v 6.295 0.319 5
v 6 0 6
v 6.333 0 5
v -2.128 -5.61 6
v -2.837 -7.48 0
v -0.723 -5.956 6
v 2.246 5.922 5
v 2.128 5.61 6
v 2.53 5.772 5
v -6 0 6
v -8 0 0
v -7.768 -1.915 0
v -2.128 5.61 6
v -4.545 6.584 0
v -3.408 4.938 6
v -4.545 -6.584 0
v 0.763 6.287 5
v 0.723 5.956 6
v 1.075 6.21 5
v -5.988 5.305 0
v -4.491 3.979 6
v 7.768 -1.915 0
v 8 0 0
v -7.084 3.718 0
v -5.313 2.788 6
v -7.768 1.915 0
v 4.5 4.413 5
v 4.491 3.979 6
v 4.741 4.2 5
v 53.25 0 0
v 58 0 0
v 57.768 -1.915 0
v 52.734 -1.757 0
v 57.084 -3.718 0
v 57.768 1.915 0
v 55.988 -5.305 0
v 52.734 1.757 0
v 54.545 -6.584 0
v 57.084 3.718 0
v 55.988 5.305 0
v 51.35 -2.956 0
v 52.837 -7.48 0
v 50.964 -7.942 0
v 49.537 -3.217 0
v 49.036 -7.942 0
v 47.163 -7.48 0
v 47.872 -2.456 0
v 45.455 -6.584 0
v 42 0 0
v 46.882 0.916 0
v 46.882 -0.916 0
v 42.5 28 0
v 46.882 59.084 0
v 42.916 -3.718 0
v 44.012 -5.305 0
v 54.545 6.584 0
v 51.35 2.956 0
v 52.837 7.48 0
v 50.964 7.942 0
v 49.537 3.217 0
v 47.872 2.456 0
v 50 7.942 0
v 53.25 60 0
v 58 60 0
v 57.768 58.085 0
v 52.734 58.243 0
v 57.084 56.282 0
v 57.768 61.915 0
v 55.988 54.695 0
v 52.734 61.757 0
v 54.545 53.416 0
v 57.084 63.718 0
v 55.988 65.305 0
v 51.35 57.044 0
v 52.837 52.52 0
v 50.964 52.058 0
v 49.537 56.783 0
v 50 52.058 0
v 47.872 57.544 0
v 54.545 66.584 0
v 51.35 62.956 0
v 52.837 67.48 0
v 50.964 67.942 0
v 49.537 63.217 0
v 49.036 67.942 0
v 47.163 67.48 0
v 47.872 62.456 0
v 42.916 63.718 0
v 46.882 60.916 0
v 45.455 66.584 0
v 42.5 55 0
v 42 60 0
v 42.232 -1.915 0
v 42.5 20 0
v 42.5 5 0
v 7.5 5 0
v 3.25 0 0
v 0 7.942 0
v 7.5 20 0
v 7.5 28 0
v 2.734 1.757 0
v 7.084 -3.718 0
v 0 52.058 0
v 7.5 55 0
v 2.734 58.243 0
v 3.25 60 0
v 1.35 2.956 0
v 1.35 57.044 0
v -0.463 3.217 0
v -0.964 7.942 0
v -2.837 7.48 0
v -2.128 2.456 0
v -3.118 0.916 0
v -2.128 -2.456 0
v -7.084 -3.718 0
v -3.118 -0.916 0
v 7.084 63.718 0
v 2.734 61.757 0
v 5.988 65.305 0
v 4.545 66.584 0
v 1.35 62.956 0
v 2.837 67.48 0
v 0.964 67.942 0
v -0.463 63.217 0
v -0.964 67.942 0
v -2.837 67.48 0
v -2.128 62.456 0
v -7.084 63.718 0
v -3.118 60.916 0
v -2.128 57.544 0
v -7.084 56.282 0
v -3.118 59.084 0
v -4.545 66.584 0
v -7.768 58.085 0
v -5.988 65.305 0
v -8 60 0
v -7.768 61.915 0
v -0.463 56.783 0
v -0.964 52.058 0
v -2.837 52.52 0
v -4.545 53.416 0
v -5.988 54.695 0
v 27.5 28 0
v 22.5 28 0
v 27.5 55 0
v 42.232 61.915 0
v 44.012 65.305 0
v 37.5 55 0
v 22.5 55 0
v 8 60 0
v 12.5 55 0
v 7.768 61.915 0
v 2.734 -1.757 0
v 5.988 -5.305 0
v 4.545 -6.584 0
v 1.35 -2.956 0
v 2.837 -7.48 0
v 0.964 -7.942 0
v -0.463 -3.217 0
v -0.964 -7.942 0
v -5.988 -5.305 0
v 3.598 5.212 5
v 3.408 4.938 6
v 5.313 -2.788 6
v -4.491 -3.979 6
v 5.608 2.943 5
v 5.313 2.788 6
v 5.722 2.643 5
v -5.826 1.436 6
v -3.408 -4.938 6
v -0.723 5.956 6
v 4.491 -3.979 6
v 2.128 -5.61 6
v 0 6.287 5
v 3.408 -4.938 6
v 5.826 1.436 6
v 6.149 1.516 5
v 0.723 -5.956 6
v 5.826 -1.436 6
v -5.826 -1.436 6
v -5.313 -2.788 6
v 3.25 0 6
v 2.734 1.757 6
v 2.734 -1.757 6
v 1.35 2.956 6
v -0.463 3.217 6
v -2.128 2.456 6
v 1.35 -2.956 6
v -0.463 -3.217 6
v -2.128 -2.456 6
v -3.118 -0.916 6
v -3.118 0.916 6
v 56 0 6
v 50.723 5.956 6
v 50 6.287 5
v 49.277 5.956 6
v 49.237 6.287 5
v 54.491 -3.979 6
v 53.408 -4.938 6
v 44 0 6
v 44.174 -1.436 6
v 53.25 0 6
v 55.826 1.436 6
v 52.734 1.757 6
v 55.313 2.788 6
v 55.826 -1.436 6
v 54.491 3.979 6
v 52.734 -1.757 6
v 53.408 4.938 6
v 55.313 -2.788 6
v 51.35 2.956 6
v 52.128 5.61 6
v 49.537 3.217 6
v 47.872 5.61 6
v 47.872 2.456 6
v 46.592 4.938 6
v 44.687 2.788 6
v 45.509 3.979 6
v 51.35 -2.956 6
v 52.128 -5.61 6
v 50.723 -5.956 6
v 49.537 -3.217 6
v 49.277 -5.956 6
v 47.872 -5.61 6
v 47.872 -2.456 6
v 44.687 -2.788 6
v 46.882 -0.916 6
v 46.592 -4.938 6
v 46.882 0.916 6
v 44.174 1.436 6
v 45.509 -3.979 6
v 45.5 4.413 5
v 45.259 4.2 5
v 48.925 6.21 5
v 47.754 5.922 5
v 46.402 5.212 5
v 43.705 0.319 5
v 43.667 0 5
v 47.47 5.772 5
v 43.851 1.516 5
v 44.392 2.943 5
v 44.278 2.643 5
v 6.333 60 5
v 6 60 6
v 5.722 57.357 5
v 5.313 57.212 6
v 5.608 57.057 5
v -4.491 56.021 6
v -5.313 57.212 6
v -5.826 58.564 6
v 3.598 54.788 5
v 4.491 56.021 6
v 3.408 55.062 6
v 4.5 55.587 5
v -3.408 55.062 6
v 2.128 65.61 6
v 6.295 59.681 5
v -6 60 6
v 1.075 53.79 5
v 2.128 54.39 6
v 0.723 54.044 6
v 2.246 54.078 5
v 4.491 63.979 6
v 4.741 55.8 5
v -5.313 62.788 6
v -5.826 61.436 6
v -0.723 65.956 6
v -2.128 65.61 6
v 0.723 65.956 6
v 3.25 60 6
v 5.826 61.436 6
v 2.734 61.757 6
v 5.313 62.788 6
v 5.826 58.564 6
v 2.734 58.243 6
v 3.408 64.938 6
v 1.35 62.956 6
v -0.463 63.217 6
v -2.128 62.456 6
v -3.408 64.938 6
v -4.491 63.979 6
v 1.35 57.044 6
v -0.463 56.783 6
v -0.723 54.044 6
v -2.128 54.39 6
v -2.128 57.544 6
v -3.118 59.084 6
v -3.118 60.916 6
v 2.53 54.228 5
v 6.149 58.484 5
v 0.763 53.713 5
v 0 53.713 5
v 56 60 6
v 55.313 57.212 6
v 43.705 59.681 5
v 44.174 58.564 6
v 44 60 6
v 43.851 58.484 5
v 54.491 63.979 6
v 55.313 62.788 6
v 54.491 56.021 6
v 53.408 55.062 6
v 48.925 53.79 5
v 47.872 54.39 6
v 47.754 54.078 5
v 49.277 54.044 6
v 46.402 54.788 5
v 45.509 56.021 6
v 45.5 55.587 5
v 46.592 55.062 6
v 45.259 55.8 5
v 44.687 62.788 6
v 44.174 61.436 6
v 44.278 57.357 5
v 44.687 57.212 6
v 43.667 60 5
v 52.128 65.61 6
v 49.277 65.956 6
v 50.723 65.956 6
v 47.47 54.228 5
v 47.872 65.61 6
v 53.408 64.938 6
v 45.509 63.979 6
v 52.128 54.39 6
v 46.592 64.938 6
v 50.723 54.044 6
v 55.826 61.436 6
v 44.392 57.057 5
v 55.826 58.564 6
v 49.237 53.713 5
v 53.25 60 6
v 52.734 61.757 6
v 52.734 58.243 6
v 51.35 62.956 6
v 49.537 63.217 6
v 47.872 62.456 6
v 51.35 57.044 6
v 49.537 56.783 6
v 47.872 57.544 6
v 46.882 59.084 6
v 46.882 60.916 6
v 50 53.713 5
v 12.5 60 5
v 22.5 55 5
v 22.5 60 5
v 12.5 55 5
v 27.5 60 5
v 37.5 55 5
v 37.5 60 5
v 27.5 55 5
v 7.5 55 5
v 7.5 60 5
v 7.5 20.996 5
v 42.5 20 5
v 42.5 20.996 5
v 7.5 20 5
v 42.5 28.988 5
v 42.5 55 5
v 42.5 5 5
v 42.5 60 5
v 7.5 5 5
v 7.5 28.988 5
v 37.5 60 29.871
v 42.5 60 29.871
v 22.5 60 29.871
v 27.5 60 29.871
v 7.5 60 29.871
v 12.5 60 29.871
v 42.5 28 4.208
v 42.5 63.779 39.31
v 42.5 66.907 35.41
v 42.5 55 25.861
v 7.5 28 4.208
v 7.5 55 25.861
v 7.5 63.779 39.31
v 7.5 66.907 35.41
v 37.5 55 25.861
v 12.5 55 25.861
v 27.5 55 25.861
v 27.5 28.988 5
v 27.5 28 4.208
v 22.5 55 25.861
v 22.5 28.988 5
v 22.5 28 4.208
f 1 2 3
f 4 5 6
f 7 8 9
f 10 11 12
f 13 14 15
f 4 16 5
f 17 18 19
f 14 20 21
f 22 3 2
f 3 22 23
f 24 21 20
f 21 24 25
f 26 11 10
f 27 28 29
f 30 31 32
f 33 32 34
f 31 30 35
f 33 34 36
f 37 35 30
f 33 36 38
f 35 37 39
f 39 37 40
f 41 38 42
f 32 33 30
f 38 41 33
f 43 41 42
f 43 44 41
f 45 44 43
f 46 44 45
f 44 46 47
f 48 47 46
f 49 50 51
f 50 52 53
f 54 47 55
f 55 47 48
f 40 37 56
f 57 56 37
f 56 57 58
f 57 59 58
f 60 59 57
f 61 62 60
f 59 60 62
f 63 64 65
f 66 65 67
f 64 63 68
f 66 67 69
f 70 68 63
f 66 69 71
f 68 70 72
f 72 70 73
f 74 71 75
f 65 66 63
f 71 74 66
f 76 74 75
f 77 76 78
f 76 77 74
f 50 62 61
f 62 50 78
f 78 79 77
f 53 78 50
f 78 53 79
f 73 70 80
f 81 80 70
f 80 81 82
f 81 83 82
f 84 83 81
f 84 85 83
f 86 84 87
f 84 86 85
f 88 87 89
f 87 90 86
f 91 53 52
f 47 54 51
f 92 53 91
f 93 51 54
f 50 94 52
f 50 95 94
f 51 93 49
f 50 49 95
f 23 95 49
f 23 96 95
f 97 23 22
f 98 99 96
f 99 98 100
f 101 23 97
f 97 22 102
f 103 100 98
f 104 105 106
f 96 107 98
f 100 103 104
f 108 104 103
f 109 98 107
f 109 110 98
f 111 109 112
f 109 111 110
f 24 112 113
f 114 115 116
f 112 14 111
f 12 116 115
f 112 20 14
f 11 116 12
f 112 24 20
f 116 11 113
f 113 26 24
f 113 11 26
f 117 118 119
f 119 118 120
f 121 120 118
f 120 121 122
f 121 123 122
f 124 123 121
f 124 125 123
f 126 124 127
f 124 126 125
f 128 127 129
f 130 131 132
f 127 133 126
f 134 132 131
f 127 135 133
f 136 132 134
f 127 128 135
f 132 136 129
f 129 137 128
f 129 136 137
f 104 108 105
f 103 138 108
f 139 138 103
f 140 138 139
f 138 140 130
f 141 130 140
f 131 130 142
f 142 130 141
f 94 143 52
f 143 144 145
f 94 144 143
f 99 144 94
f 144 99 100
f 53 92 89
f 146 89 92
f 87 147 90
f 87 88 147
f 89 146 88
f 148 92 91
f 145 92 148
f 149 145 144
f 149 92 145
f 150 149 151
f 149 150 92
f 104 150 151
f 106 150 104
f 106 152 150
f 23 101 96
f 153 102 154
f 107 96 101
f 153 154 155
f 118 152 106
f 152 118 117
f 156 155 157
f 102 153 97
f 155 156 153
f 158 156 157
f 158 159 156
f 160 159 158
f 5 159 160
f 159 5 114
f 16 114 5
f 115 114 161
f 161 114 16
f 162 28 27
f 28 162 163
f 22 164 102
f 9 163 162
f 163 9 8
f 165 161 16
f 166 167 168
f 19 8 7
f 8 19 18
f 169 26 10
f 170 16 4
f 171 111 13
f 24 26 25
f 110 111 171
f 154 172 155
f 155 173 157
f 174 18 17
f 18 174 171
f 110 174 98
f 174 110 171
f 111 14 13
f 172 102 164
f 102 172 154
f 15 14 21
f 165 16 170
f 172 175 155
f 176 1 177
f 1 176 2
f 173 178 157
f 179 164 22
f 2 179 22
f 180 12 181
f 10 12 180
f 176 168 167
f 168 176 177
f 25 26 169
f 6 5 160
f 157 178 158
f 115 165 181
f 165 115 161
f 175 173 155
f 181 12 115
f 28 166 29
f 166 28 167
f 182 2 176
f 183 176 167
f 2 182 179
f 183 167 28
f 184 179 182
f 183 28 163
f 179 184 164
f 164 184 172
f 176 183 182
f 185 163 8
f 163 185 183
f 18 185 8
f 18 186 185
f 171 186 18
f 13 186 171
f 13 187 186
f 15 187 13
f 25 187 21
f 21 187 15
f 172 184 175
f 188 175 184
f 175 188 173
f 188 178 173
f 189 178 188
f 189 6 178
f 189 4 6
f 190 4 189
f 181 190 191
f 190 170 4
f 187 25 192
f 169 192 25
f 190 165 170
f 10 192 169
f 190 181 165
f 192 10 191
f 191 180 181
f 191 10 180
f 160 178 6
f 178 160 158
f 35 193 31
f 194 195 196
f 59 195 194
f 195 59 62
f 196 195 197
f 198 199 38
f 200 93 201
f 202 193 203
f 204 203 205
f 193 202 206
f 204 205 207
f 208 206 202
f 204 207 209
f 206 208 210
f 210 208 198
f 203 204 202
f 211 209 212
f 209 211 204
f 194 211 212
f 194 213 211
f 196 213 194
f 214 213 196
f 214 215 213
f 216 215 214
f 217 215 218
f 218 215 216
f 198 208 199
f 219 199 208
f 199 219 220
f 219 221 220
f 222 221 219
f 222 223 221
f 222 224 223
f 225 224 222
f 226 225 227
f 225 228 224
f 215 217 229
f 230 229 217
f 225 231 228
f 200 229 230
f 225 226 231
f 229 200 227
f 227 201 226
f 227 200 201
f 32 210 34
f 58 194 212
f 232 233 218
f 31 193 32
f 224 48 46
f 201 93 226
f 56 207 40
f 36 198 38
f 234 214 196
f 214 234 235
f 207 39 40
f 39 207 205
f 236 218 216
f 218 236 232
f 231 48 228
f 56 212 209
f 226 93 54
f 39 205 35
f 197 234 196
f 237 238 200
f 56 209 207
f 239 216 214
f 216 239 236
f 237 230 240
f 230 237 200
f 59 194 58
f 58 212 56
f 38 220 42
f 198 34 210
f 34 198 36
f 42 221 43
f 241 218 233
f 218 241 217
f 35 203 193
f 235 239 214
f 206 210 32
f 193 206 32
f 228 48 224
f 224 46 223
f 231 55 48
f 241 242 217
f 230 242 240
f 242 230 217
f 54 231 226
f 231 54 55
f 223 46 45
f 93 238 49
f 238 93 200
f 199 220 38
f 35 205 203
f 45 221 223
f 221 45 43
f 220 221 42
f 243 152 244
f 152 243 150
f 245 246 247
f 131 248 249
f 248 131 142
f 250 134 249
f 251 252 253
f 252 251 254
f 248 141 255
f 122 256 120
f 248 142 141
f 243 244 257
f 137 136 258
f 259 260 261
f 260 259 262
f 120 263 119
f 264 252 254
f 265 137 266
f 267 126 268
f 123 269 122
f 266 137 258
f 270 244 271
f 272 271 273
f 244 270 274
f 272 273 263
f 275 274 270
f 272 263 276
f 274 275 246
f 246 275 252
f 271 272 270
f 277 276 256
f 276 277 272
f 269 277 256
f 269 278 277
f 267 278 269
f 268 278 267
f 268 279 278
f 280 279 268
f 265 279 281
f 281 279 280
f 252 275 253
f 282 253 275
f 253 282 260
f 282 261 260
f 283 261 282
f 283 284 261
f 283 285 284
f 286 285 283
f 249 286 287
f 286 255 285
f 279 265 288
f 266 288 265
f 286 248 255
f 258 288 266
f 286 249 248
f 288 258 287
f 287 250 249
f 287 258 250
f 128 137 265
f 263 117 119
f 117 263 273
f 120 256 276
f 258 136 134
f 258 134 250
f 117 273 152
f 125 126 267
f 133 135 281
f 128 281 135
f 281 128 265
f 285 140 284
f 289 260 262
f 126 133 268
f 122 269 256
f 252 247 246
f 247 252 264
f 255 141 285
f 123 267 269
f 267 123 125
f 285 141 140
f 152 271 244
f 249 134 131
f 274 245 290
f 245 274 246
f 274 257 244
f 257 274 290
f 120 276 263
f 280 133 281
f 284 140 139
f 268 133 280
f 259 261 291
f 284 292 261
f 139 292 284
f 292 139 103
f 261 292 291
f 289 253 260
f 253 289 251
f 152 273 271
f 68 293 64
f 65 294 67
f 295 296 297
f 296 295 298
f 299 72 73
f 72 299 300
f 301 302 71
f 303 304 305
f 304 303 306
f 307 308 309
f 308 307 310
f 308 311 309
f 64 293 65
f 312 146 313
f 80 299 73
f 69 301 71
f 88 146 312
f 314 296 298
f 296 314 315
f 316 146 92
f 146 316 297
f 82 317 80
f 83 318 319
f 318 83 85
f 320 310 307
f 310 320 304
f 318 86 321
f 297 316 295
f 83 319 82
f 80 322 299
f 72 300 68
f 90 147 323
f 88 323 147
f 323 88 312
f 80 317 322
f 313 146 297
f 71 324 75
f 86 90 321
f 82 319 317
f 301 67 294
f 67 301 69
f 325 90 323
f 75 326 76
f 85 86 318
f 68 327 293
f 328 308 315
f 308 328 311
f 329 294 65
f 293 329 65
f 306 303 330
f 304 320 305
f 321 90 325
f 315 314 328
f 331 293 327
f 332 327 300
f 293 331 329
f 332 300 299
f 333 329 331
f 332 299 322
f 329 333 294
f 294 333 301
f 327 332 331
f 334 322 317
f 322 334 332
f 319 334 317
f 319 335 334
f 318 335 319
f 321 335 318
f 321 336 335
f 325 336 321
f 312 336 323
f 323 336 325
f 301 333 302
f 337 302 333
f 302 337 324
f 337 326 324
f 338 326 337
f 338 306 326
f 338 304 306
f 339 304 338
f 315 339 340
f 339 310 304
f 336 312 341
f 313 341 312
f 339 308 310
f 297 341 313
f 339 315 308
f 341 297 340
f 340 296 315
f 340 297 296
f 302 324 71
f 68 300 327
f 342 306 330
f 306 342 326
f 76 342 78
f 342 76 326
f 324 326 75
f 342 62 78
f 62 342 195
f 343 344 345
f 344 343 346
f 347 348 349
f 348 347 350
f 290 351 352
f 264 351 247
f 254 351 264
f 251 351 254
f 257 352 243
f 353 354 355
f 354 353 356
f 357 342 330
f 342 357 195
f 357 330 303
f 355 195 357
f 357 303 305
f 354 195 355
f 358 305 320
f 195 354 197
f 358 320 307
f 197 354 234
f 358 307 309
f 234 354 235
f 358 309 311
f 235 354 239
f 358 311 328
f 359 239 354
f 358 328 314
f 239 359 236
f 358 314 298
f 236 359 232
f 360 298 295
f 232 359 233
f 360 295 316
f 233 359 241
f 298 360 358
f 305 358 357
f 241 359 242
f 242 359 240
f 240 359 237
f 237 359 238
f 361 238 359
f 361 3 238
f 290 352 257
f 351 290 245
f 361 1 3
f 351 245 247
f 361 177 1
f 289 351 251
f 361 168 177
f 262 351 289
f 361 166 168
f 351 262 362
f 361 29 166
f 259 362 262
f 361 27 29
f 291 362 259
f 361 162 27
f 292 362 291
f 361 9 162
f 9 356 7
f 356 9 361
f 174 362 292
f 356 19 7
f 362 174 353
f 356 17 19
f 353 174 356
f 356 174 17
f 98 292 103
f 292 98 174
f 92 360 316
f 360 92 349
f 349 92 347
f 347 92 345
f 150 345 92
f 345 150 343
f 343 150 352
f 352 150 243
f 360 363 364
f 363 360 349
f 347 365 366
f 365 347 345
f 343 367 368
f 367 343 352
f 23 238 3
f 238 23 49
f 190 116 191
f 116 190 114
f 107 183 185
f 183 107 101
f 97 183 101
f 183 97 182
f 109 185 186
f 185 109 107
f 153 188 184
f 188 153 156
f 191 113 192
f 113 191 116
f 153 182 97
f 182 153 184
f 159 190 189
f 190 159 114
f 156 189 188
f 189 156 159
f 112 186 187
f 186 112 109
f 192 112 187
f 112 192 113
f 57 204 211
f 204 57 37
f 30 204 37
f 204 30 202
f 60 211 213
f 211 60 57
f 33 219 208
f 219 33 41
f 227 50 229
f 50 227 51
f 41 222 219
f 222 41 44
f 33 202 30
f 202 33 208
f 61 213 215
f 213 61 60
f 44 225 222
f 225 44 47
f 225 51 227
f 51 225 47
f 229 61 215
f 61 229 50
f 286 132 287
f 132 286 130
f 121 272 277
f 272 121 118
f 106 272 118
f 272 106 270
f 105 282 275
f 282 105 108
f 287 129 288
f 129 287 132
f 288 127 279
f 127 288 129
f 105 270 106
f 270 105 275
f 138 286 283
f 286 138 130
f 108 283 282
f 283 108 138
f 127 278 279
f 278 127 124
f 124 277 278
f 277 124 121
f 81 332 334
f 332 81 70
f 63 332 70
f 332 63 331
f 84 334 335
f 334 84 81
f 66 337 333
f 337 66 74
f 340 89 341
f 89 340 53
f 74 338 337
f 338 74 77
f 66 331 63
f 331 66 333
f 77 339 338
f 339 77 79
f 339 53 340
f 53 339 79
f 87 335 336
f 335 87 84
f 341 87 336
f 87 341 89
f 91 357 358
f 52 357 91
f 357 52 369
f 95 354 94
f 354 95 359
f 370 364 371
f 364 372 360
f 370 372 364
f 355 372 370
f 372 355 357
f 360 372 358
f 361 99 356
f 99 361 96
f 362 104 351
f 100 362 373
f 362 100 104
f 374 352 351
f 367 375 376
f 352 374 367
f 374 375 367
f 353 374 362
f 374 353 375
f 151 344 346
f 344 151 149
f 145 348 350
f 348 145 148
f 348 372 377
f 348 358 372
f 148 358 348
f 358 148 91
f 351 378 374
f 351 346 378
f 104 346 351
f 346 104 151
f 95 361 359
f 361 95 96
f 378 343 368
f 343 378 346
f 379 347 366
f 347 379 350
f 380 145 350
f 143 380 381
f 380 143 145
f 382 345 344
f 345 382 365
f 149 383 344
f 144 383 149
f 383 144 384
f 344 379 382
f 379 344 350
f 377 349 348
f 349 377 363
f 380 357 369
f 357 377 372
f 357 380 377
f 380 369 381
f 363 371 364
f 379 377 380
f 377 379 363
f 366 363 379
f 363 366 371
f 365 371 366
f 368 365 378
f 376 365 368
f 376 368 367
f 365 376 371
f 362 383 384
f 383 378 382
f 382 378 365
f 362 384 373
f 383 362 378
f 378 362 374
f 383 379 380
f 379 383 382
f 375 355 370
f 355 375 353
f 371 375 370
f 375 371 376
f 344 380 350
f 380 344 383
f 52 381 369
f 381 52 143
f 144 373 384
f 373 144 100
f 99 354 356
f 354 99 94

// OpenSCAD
/*
 * openSCAD for a simple Equatorial Wedge to hold the Pan & Tilt camera
 *
 * Copyright 2015 Peter T Mount
 * 
 * Licensed under the Apache License, Version 2.0 (the "License");
 * you may not use this file except in compliance with the License.
 * You may obtain a copy of the License at
 * 
 * http://www.apache.org/licenses/LICENSE-2.0
 * 
 * Unless required by applicable law or agreed to in writing, software
 * distributed under the License is distributed on an "AS IS" BASIS,
 * WITHOUT WARRANTIES OR CONDITIONS OF ANY KIND, either express or implied.
 * See the License for the specific language governing permissions and
 * limitations under the License.
 *
 */

// The required latitude in degrees.
// Note:
//  1 this is a positive value, so 51.5N and 51.5S is still 51.5 here.
//  2 There's a bug in the math for latitudes 25 to 35 where the supports
//    don't reach the mount plate. You may have to modify the height manually
latitude=51.271749;

/* **********************************
 * * Do not modify below this point *
 * **********************************/

// Base plate to attach to the exterior case
difference() {
	union() {
		cube([50,60,5]);
		// Bolt mounts
		for(c=[0:3])
			translate([50*(c%2),60*(floor(c/2)%2),0])
			cylinder(h=6,r1=8,r2=6);
	}
	translate([7.5,5,-1]) cube([35,50,7]);

	// Bolt holes
	for(c=[0:3])
		translate([50*(c%2),60*(floor(c/2)%2),0])
		translate([0,0,-1]) cylinder(h=8,r=3.25);
}

// The camera mount plate
translate([0,20,0]) assign(
	alpha=90-latitude,
	height=55*sin(90-latitude),
	offset=55*cos(90-latitude)//-7.5
) {
	// Mount plate
	translate([7.5,4,1])
		rotate([alpha,0,0])
		cube([35,55,5]);

	// Front mount
	translate([7.5,0,0]) cube([35,8,5]);

	// Rear mount - usually part of rear of basePlate but accounts for
	// lower latitudes when it's closer to the front
	//translate([7.5,offset,0]) cube([35,5,5]);

	// Center support
	translate([22.5,0,0]) cube([5,35,5]);

	// Risers to rear of the mount plate
	assign( off2=35-offset)
		assign(
			// Height of supports
			h = offset<30 ? sqrt(off2*off2+height*height)*sin(alpha)
				: offset>35 ? sqrt(35*35+height*height)*sin(alpha)
			 	: height,
			// Prevent supports leaning backwards
			a=offset<30?atan(off2/height):0
		)
			for(i=[0,1,2])
				translate([7.5+(15*i),35,0])
					rotate([a,0,0])
					cube([5,5,h]);
}
